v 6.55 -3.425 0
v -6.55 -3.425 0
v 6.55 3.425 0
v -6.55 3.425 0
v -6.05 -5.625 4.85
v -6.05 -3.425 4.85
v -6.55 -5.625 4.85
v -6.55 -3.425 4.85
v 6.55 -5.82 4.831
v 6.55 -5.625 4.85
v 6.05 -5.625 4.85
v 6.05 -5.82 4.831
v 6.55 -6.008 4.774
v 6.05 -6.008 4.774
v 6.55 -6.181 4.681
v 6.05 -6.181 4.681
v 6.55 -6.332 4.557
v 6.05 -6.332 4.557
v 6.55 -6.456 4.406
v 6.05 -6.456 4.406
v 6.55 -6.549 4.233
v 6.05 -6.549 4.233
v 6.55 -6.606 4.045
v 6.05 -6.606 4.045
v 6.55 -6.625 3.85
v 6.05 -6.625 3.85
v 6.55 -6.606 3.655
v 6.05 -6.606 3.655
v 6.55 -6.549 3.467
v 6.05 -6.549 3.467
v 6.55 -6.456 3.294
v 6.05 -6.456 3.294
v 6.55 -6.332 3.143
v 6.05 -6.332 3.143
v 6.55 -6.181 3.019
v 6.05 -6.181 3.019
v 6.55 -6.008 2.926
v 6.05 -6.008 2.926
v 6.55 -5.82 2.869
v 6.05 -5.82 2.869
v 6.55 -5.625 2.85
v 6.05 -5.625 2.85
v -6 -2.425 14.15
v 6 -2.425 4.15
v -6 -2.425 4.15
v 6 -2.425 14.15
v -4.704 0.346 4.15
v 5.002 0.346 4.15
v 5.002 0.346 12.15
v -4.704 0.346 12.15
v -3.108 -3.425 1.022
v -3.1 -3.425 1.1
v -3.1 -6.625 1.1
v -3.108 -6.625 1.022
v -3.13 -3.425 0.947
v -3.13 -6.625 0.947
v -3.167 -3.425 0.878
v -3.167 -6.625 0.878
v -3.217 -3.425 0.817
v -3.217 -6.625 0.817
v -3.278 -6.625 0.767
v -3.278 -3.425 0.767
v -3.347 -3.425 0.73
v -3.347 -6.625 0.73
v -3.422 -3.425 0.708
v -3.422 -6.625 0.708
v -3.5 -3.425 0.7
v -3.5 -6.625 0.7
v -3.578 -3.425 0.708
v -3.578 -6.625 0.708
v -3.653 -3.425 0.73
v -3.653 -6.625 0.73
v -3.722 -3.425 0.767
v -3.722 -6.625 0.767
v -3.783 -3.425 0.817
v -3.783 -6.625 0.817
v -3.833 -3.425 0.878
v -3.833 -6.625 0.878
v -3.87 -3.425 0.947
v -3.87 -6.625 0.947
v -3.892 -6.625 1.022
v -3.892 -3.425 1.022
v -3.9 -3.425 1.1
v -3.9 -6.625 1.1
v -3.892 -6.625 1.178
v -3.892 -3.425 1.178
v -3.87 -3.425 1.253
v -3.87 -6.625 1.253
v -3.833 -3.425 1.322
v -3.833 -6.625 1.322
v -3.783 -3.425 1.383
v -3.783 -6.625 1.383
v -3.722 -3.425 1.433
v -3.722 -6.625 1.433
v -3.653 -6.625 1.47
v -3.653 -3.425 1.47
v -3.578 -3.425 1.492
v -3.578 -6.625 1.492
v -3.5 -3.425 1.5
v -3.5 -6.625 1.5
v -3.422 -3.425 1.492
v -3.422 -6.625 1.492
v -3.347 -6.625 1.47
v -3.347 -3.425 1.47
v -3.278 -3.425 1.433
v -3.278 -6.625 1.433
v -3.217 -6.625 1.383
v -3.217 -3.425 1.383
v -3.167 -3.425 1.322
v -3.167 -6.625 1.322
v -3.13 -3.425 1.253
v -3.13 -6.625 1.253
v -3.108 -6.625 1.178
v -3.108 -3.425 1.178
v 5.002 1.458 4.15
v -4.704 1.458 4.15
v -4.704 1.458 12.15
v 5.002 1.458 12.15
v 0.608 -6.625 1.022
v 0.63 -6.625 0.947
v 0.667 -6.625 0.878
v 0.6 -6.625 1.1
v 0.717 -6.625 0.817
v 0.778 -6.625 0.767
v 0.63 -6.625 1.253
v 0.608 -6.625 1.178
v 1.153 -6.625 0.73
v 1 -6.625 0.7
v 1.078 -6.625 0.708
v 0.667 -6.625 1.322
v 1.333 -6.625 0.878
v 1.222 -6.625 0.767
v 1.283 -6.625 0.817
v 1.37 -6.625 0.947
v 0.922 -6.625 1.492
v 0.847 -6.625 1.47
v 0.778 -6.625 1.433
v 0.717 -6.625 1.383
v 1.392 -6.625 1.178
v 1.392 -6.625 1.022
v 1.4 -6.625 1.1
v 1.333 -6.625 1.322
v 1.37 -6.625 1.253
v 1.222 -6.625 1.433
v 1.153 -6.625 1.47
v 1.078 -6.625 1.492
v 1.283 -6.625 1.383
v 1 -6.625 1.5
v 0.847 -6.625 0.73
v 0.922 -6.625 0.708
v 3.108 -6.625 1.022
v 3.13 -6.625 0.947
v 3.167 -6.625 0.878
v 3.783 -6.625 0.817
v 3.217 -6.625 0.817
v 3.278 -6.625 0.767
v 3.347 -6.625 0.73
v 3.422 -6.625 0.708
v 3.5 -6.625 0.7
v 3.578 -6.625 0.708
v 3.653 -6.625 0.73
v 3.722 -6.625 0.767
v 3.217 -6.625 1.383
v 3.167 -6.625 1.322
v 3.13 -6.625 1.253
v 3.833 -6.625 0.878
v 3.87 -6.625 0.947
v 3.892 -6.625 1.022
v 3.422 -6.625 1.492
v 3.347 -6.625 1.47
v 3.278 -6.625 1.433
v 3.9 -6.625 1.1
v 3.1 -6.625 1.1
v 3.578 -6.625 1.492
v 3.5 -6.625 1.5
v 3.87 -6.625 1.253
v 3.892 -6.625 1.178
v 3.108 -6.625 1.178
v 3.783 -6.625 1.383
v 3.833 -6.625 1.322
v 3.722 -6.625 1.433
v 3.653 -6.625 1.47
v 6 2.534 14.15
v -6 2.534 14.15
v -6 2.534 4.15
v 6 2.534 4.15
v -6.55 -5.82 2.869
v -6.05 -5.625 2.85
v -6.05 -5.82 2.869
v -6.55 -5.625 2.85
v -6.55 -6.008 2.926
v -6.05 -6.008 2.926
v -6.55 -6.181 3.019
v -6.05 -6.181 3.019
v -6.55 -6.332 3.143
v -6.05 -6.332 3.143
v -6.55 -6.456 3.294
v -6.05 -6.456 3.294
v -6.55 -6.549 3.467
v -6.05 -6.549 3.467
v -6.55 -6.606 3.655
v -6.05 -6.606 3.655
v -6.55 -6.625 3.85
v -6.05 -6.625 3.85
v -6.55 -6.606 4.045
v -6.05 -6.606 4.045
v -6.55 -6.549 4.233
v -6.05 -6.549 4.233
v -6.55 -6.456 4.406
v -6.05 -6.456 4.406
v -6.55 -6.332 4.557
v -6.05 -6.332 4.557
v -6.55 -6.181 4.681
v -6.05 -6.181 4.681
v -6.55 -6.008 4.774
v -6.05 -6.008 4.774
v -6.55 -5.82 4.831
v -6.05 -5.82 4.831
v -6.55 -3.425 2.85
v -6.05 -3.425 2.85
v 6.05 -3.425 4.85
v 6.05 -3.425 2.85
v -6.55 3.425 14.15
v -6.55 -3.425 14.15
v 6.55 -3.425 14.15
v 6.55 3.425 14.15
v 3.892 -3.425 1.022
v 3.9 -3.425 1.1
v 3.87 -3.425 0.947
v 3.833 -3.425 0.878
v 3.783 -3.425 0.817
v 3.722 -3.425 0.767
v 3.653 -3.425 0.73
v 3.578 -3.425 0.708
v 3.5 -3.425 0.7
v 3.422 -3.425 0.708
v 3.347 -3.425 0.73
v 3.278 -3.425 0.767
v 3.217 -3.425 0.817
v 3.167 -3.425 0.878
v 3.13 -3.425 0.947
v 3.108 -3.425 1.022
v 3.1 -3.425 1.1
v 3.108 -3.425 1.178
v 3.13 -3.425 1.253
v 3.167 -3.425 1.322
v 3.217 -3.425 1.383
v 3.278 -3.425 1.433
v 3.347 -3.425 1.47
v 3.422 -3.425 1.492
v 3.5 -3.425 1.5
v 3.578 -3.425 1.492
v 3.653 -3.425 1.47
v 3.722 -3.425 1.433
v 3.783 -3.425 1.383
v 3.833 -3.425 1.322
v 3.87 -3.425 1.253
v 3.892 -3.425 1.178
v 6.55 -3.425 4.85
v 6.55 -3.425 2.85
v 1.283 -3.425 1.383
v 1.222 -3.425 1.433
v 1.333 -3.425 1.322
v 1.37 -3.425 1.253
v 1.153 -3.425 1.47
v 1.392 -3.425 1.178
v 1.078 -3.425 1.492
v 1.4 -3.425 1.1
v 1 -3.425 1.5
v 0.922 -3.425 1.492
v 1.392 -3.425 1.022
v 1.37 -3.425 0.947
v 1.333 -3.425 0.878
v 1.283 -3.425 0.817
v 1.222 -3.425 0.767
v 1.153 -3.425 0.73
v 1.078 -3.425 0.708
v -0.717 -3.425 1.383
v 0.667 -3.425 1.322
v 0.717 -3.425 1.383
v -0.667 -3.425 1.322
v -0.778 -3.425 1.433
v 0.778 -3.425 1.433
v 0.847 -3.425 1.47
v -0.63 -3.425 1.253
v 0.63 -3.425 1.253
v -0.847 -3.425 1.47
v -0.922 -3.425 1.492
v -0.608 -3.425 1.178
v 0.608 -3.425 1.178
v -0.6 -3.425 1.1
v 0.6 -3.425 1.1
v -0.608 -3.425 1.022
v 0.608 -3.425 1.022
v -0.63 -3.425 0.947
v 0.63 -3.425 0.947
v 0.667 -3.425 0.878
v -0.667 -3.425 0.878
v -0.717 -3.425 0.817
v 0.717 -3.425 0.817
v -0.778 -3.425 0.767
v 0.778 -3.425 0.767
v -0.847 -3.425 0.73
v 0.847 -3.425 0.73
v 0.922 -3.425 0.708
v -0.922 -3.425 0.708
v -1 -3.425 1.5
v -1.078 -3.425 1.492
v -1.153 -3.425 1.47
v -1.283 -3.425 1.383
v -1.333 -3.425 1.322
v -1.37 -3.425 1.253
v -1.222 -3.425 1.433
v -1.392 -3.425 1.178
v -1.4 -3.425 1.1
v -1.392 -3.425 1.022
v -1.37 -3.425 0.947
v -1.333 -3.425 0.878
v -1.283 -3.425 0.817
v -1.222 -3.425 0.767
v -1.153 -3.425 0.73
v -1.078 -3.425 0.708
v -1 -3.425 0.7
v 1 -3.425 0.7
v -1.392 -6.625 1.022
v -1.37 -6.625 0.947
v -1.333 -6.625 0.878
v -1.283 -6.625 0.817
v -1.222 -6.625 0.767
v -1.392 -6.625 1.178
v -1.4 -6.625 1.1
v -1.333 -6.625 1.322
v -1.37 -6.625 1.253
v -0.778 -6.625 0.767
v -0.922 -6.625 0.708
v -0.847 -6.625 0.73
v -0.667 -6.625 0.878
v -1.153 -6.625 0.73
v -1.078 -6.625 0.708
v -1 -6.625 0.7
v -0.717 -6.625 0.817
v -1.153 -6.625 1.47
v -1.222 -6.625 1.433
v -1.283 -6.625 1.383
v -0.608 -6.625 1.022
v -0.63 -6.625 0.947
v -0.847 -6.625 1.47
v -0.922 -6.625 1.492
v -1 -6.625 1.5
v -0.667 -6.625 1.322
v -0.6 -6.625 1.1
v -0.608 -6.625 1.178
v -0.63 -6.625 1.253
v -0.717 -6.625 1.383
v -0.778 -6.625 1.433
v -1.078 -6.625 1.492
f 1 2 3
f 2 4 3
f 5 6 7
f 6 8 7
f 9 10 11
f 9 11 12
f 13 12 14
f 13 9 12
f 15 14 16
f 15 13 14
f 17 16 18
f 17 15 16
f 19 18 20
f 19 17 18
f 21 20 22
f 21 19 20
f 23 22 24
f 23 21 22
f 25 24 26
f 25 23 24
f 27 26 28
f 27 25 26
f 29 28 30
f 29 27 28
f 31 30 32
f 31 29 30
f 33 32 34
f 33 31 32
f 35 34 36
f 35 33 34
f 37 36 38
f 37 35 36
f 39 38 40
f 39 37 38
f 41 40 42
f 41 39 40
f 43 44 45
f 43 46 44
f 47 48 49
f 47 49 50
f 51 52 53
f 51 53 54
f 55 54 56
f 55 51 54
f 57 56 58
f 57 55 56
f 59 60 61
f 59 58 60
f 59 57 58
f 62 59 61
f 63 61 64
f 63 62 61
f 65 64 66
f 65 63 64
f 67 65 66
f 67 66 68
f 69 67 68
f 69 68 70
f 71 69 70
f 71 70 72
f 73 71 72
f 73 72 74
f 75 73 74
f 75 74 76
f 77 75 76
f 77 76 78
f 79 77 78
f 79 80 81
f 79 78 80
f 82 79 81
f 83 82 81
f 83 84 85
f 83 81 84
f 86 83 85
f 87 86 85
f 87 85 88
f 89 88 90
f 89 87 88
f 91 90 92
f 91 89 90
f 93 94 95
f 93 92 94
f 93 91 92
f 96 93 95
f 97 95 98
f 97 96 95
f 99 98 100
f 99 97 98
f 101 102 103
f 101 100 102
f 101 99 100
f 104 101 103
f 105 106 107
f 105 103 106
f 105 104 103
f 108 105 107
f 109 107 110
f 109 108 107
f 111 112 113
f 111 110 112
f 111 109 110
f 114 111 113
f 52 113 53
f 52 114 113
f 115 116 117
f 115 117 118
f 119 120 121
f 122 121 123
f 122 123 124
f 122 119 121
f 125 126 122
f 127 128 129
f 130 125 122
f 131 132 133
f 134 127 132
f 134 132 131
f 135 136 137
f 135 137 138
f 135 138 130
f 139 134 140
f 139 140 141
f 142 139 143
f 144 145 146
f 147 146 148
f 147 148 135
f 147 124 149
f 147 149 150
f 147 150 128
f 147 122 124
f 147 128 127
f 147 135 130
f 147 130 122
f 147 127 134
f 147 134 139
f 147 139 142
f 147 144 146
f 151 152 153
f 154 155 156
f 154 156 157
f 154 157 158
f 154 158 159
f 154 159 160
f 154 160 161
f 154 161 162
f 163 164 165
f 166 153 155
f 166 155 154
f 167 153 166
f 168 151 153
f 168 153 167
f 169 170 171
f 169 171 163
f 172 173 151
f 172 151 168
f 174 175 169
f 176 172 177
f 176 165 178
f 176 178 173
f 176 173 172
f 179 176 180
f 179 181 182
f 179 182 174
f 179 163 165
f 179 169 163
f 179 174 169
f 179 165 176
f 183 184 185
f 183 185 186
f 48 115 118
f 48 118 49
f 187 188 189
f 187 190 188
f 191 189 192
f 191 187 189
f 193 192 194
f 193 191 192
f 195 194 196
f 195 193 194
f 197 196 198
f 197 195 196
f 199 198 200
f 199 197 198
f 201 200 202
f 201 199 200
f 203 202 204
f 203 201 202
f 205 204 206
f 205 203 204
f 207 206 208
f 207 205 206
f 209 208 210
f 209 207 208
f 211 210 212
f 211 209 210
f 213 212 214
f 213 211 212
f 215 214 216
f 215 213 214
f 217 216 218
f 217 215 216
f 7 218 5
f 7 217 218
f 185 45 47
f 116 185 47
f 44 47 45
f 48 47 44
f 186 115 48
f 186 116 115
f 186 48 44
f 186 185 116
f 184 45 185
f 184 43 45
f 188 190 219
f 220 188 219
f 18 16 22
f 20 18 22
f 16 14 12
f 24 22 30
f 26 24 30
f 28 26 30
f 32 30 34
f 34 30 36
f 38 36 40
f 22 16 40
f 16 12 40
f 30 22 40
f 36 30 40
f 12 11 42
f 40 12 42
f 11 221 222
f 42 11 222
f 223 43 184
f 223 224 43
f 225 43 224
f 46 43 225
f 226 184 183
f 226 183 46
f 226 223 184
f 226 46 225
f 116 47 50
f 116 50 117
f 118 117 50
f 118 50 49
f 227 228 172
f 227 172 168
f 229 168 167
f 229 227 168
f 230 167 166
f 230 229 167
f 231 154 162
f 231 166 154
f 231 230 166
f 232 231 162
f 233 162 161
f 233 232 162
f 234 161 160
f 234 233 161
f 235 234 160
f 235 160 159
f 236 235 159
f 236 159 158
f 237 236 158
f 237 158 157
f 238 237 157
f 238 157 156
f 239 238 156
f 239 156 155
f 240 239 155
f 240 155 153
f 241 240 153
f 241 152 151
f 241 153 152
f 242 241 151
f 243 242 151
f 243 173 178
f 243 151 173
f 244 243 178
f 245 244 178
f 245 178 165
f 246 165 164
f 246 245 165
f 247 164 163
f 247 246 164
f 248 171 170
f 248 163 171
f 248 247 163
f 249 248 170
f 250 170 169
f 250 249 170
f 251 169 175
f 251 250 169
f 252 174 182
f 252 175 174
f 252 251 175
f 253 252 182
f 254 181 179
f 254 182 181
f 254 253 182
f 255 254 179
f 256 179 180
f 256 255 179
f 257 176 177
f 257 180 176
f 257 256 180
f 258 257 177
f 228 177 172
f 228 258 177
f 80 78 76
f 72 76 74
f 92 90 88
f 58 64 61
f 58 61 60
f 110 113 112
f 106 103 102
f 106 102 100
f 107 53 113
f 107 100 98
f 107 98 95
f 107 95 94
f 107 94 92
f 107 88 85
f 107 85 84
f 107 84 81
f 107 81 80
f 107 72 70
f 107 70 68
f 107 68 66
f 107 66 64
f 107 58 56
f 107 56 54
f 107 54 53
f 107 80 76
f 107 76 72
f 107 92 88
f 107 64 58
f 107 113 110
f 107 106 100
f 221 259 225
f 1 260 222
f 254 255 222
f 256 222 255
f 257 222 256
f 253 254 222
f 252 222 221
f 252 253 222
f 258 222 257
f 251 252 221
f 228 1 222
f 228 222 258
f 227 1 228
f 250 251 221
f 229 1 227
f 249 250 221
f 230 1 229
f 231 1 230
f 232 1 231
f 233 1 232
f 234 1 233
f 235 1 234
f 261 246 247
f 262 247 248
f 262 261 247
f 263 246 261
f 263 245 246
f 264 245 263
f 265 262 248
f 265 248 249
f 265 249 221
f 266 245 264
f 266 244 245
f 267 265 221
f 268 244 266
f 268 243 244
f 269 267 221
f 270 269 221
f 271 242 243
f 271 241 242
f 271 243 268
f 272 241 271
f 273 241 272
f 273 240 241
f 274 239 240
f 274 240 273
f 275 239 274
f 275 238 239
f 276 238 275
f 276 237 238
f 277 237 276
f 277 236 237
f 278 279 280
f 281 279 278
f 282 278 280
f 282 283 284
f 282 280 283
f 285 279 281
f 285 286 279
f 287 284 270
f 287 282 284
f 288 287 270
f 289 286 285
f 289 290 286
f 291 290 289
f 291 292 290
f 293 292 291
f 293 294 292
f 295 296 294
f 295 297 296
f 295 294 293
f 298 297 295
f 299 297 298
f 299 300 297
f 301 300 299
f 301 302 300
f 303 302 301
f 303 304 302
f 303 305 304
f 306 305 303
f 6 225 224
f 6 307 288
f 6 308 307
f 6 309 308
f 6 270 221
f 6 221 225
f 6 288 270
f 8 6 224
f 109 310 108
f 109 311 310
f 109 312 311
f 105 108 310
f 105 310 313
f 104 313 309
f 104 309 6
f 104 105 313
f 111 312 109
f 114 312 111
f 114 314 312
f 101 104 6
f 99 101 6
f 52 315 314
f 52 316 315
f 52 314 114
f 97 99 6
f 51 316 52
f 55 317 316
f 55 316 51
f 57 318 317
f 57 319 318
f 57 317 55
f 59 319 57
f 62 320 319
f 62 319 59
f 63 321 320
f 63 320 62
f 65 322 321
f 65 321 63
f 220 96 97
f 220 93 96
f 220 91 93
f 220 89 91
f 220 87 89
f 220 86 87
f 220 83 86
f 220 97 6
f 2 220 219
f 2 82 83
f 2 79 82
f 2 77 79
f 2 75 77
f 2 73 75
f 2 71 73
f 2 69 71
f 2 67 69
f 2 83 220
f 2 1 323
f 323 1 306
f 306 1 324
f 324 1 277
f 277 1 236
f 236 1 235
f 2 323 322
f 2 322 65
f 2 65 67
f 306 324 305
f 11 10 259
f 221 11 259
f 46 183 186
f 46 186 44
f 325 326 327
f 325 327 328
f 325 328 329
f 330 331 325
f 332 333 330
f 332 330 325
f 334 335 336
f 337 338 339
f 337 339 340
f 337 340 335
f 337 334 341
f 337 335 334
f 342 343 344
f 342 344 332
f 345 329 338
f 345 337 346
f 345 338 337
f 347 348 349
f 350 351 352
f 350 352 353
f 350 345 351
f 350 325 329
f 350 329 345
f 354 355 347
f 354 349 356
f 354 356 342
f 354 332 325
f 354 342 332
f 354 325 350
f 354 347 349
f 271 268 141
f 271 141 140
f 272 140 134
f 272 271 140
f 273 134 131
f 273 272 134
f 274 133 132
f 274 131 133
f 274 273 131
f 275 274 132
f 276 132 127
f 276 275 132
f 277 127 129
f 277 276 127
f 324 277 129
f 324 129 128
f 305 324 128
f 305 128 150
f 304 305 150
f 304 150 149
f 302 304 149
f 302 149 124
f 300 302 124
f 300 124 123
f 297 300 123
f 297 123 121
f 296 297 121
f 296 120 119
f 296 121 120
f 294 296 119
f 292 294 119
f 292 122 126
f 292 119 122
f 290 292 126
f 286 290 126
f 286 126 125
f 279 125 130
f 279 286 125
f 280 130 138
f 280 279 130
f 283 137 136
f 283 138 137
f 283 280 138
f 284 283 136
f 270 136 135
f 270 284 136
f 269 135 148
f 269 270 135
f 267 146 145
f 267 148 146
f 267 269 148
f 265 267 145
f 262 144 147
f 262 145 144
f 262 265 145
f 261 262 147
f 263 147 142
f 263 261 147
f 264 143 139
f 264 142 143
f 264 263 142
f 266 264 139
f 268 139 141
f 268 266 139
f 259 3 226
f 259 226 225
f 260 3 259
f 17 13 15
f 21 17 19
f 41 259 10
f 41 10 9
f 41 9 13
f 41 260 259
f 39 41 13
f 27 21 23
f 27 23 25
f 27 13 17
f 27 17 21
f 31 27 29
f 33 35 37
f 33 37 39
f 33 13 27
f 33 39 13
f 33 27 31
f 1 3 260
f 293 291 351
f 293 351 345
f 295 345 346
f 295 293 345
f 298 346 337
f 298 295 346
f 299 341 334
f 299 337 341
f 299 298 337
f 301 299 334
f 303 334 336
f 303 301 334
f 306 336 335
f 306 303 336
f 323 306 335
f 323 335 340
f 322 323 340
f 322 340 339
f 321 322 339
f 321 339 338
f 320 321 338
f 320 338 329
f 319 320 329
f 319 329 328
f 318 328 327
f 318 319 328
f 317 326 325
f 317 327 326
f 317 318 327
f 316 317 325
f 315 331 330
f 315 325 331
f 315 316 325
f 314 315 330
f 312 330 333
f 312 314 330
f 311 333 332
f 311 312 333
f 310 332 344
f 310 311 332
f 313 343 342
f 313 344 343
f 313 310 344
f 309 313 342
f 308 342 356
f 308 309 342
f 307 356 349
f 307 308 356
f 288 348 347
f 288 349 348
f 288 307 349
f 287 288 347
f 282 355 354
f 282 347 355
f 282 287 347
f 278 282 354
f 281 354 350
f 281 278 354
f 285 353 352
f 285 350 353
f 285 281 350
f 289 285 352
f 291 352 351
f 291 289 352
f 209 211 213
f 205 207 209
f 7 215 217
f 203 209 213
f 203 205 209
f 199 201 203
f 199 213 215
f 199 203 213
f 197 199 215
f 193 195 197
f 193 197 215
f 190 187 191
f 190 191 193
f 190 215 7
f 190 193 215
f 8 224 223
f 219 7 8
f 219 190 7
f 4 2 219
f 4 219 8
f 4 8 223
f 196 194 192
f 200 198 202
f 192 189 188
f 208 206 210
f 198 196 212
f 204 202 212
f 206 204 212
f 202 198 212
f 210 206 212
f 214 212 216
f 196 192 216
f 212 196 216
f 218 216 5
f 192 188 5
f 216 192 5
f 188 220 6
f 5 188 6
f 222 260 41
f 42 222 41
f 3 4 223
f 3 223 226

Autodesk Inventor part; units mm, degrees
ref_plane "YZ Plane" through (0, 0, 0) normal (1, 0, 0) x (0, 1, 0)
ref_plane "XZ Plane" through (0, 0, 0) normal (0, 1, 0) x (-1, 0, 0)
ref_plane "XY Plane" through (0, 0, 0) normal (0, 0, 1) x (1, 0, 0)
sketch "Sketch1" plane through (0, 0, 0) normal (0, 0, 1) x (1, 0, 0)
  line L0 (-6.55, 3.425) -> (6.55, 3.425)
  line L1 (6.55, 3.425) -> (6.55, -3.425)
  line L2 (6.55, -3.425) -> (-6.55, -3.425)
  line L3 (-6.55, -3.425) -> (-6.55, 3.425)
  point P0 (0, 0)
  dimension "d0" = 13.1
  dimension "d1" = 6.85
  dimension "d2" = 3.425
  dimension "d3" = 6.55
extrude "Extrusion1" add sketch "Sketch1" along normal blind 14.15
sketch "Sketch2" plane through (0, 0, 14.15) normal (0, 0, 1) x (1, 0, 0)
  line L0 (-6, 2.5343) -> (6, 2.5343)
  line L1 (6, 2.5343) -> (6, -2.425)
  line L2 (6, -2.425) -> (-6, -2.425)
  line L3 (-6, -2.425) -> (-6, 2.5343)
  line L4 (-6.55, -3.425) -> (6.55, -3.425) projected
  line L5 (6.55, 3.425) -> (-6.55, 3.425) projected
  point P0 (0, 0)
  dimension "d7" = 12
  dimension "d8" = 6
  dimension "d9" = 1
extrude "Extrusion2" cut sketch "Sketch2" against normal blind 10
sketch "Sketch3" plane through (0, 0, 4.15) normal (0, 0, 1) x (1, 0, 0)
  line L0 (-4.7039, 1.4576) -> (5.0017, 1.4576)
  line L1 (5.0017, 1.4576) -> (5.0017, 0.3455)
  line L2 (5.0017, 0.3455) -> (-4.7039, 0.3455)
  line L3 (-4.7039, 0.3455) -> (-4.7039, 1.4576)
  point P0 (0, 0)
extrude "Extrusion3" add sketch "Sketch3" along normal blind 8
sketch "Sketch4" plane through (6.55, -3.425, 0) normal (1, 0, 0) x (0, 0, -1)
  line L0 (-4.85, 2.838) -> (-2.85, 2.838)
  line L1 (-2.85, 2.838) -> (-2.85, -3.2)
  line L2 (-2.85, -3.2) -> (-4.85, -3.2)
  line L3 (-4.85, -3.2) -> (-4.85, 2.838)
  line L4 (-14.15, 0) -> (-14.15, 6.85) projected
  arc A0 (-4.85, -2.2) -> (-2.85, -2.2) centre (-3.85, -2.2) ccw
  point P0 (0, 3.425)
  dimension "d17" = 2
  dimension "d18" = 9.3
  dimension "d21" = 3.2
extrude "Extrusion4" add sketch "Sketch4" against normal blind 0.5 contours L0 L1 A0 L3
sketch "Sketch5" plane through (-6.55, -3.425, 0) normal (0, -1, 0) x (1, 0, 0)
  line L0 (13.8244, -1.52) -> (1.8735, -1.52) construction
  line L1 (13.8244, 1.1) -> (1.8735, 1.1) construction
  line L2 (13.1, 4.85) -> (12.6, 4.85) projected
  circle A0 centre (5.55, 1.1) radius 0.4
  circle A1 centre (7.55, 1.1) radius 0.4
  circle A2 centre (3.05, 1.1) radius 0.4
  circle A3 centre (10.05, 1.1) radius 0.4
  point P0 (6.55, 0)
  dimension "d25" = 2.62
  dimension "d26" = 3.75
  dimension "d29" = 2
  dimension "d30" = 1
  dimension "d31" = 2.5
  dimension "d34" = 2.5
  dimension "d35" = 0.8
  dimension "d36" = 0.8
  dimension "d40" = 0.8
  dimension "d42" = 0.8
extrude "Extrusion5" add sketch "Sketch5" along normal blind 3.2
mirror "Mirror1" about plane through (0, 0, 0) normal (1, 0, 0) of "Extrusion4"
properties part number "USBA_CNC"
